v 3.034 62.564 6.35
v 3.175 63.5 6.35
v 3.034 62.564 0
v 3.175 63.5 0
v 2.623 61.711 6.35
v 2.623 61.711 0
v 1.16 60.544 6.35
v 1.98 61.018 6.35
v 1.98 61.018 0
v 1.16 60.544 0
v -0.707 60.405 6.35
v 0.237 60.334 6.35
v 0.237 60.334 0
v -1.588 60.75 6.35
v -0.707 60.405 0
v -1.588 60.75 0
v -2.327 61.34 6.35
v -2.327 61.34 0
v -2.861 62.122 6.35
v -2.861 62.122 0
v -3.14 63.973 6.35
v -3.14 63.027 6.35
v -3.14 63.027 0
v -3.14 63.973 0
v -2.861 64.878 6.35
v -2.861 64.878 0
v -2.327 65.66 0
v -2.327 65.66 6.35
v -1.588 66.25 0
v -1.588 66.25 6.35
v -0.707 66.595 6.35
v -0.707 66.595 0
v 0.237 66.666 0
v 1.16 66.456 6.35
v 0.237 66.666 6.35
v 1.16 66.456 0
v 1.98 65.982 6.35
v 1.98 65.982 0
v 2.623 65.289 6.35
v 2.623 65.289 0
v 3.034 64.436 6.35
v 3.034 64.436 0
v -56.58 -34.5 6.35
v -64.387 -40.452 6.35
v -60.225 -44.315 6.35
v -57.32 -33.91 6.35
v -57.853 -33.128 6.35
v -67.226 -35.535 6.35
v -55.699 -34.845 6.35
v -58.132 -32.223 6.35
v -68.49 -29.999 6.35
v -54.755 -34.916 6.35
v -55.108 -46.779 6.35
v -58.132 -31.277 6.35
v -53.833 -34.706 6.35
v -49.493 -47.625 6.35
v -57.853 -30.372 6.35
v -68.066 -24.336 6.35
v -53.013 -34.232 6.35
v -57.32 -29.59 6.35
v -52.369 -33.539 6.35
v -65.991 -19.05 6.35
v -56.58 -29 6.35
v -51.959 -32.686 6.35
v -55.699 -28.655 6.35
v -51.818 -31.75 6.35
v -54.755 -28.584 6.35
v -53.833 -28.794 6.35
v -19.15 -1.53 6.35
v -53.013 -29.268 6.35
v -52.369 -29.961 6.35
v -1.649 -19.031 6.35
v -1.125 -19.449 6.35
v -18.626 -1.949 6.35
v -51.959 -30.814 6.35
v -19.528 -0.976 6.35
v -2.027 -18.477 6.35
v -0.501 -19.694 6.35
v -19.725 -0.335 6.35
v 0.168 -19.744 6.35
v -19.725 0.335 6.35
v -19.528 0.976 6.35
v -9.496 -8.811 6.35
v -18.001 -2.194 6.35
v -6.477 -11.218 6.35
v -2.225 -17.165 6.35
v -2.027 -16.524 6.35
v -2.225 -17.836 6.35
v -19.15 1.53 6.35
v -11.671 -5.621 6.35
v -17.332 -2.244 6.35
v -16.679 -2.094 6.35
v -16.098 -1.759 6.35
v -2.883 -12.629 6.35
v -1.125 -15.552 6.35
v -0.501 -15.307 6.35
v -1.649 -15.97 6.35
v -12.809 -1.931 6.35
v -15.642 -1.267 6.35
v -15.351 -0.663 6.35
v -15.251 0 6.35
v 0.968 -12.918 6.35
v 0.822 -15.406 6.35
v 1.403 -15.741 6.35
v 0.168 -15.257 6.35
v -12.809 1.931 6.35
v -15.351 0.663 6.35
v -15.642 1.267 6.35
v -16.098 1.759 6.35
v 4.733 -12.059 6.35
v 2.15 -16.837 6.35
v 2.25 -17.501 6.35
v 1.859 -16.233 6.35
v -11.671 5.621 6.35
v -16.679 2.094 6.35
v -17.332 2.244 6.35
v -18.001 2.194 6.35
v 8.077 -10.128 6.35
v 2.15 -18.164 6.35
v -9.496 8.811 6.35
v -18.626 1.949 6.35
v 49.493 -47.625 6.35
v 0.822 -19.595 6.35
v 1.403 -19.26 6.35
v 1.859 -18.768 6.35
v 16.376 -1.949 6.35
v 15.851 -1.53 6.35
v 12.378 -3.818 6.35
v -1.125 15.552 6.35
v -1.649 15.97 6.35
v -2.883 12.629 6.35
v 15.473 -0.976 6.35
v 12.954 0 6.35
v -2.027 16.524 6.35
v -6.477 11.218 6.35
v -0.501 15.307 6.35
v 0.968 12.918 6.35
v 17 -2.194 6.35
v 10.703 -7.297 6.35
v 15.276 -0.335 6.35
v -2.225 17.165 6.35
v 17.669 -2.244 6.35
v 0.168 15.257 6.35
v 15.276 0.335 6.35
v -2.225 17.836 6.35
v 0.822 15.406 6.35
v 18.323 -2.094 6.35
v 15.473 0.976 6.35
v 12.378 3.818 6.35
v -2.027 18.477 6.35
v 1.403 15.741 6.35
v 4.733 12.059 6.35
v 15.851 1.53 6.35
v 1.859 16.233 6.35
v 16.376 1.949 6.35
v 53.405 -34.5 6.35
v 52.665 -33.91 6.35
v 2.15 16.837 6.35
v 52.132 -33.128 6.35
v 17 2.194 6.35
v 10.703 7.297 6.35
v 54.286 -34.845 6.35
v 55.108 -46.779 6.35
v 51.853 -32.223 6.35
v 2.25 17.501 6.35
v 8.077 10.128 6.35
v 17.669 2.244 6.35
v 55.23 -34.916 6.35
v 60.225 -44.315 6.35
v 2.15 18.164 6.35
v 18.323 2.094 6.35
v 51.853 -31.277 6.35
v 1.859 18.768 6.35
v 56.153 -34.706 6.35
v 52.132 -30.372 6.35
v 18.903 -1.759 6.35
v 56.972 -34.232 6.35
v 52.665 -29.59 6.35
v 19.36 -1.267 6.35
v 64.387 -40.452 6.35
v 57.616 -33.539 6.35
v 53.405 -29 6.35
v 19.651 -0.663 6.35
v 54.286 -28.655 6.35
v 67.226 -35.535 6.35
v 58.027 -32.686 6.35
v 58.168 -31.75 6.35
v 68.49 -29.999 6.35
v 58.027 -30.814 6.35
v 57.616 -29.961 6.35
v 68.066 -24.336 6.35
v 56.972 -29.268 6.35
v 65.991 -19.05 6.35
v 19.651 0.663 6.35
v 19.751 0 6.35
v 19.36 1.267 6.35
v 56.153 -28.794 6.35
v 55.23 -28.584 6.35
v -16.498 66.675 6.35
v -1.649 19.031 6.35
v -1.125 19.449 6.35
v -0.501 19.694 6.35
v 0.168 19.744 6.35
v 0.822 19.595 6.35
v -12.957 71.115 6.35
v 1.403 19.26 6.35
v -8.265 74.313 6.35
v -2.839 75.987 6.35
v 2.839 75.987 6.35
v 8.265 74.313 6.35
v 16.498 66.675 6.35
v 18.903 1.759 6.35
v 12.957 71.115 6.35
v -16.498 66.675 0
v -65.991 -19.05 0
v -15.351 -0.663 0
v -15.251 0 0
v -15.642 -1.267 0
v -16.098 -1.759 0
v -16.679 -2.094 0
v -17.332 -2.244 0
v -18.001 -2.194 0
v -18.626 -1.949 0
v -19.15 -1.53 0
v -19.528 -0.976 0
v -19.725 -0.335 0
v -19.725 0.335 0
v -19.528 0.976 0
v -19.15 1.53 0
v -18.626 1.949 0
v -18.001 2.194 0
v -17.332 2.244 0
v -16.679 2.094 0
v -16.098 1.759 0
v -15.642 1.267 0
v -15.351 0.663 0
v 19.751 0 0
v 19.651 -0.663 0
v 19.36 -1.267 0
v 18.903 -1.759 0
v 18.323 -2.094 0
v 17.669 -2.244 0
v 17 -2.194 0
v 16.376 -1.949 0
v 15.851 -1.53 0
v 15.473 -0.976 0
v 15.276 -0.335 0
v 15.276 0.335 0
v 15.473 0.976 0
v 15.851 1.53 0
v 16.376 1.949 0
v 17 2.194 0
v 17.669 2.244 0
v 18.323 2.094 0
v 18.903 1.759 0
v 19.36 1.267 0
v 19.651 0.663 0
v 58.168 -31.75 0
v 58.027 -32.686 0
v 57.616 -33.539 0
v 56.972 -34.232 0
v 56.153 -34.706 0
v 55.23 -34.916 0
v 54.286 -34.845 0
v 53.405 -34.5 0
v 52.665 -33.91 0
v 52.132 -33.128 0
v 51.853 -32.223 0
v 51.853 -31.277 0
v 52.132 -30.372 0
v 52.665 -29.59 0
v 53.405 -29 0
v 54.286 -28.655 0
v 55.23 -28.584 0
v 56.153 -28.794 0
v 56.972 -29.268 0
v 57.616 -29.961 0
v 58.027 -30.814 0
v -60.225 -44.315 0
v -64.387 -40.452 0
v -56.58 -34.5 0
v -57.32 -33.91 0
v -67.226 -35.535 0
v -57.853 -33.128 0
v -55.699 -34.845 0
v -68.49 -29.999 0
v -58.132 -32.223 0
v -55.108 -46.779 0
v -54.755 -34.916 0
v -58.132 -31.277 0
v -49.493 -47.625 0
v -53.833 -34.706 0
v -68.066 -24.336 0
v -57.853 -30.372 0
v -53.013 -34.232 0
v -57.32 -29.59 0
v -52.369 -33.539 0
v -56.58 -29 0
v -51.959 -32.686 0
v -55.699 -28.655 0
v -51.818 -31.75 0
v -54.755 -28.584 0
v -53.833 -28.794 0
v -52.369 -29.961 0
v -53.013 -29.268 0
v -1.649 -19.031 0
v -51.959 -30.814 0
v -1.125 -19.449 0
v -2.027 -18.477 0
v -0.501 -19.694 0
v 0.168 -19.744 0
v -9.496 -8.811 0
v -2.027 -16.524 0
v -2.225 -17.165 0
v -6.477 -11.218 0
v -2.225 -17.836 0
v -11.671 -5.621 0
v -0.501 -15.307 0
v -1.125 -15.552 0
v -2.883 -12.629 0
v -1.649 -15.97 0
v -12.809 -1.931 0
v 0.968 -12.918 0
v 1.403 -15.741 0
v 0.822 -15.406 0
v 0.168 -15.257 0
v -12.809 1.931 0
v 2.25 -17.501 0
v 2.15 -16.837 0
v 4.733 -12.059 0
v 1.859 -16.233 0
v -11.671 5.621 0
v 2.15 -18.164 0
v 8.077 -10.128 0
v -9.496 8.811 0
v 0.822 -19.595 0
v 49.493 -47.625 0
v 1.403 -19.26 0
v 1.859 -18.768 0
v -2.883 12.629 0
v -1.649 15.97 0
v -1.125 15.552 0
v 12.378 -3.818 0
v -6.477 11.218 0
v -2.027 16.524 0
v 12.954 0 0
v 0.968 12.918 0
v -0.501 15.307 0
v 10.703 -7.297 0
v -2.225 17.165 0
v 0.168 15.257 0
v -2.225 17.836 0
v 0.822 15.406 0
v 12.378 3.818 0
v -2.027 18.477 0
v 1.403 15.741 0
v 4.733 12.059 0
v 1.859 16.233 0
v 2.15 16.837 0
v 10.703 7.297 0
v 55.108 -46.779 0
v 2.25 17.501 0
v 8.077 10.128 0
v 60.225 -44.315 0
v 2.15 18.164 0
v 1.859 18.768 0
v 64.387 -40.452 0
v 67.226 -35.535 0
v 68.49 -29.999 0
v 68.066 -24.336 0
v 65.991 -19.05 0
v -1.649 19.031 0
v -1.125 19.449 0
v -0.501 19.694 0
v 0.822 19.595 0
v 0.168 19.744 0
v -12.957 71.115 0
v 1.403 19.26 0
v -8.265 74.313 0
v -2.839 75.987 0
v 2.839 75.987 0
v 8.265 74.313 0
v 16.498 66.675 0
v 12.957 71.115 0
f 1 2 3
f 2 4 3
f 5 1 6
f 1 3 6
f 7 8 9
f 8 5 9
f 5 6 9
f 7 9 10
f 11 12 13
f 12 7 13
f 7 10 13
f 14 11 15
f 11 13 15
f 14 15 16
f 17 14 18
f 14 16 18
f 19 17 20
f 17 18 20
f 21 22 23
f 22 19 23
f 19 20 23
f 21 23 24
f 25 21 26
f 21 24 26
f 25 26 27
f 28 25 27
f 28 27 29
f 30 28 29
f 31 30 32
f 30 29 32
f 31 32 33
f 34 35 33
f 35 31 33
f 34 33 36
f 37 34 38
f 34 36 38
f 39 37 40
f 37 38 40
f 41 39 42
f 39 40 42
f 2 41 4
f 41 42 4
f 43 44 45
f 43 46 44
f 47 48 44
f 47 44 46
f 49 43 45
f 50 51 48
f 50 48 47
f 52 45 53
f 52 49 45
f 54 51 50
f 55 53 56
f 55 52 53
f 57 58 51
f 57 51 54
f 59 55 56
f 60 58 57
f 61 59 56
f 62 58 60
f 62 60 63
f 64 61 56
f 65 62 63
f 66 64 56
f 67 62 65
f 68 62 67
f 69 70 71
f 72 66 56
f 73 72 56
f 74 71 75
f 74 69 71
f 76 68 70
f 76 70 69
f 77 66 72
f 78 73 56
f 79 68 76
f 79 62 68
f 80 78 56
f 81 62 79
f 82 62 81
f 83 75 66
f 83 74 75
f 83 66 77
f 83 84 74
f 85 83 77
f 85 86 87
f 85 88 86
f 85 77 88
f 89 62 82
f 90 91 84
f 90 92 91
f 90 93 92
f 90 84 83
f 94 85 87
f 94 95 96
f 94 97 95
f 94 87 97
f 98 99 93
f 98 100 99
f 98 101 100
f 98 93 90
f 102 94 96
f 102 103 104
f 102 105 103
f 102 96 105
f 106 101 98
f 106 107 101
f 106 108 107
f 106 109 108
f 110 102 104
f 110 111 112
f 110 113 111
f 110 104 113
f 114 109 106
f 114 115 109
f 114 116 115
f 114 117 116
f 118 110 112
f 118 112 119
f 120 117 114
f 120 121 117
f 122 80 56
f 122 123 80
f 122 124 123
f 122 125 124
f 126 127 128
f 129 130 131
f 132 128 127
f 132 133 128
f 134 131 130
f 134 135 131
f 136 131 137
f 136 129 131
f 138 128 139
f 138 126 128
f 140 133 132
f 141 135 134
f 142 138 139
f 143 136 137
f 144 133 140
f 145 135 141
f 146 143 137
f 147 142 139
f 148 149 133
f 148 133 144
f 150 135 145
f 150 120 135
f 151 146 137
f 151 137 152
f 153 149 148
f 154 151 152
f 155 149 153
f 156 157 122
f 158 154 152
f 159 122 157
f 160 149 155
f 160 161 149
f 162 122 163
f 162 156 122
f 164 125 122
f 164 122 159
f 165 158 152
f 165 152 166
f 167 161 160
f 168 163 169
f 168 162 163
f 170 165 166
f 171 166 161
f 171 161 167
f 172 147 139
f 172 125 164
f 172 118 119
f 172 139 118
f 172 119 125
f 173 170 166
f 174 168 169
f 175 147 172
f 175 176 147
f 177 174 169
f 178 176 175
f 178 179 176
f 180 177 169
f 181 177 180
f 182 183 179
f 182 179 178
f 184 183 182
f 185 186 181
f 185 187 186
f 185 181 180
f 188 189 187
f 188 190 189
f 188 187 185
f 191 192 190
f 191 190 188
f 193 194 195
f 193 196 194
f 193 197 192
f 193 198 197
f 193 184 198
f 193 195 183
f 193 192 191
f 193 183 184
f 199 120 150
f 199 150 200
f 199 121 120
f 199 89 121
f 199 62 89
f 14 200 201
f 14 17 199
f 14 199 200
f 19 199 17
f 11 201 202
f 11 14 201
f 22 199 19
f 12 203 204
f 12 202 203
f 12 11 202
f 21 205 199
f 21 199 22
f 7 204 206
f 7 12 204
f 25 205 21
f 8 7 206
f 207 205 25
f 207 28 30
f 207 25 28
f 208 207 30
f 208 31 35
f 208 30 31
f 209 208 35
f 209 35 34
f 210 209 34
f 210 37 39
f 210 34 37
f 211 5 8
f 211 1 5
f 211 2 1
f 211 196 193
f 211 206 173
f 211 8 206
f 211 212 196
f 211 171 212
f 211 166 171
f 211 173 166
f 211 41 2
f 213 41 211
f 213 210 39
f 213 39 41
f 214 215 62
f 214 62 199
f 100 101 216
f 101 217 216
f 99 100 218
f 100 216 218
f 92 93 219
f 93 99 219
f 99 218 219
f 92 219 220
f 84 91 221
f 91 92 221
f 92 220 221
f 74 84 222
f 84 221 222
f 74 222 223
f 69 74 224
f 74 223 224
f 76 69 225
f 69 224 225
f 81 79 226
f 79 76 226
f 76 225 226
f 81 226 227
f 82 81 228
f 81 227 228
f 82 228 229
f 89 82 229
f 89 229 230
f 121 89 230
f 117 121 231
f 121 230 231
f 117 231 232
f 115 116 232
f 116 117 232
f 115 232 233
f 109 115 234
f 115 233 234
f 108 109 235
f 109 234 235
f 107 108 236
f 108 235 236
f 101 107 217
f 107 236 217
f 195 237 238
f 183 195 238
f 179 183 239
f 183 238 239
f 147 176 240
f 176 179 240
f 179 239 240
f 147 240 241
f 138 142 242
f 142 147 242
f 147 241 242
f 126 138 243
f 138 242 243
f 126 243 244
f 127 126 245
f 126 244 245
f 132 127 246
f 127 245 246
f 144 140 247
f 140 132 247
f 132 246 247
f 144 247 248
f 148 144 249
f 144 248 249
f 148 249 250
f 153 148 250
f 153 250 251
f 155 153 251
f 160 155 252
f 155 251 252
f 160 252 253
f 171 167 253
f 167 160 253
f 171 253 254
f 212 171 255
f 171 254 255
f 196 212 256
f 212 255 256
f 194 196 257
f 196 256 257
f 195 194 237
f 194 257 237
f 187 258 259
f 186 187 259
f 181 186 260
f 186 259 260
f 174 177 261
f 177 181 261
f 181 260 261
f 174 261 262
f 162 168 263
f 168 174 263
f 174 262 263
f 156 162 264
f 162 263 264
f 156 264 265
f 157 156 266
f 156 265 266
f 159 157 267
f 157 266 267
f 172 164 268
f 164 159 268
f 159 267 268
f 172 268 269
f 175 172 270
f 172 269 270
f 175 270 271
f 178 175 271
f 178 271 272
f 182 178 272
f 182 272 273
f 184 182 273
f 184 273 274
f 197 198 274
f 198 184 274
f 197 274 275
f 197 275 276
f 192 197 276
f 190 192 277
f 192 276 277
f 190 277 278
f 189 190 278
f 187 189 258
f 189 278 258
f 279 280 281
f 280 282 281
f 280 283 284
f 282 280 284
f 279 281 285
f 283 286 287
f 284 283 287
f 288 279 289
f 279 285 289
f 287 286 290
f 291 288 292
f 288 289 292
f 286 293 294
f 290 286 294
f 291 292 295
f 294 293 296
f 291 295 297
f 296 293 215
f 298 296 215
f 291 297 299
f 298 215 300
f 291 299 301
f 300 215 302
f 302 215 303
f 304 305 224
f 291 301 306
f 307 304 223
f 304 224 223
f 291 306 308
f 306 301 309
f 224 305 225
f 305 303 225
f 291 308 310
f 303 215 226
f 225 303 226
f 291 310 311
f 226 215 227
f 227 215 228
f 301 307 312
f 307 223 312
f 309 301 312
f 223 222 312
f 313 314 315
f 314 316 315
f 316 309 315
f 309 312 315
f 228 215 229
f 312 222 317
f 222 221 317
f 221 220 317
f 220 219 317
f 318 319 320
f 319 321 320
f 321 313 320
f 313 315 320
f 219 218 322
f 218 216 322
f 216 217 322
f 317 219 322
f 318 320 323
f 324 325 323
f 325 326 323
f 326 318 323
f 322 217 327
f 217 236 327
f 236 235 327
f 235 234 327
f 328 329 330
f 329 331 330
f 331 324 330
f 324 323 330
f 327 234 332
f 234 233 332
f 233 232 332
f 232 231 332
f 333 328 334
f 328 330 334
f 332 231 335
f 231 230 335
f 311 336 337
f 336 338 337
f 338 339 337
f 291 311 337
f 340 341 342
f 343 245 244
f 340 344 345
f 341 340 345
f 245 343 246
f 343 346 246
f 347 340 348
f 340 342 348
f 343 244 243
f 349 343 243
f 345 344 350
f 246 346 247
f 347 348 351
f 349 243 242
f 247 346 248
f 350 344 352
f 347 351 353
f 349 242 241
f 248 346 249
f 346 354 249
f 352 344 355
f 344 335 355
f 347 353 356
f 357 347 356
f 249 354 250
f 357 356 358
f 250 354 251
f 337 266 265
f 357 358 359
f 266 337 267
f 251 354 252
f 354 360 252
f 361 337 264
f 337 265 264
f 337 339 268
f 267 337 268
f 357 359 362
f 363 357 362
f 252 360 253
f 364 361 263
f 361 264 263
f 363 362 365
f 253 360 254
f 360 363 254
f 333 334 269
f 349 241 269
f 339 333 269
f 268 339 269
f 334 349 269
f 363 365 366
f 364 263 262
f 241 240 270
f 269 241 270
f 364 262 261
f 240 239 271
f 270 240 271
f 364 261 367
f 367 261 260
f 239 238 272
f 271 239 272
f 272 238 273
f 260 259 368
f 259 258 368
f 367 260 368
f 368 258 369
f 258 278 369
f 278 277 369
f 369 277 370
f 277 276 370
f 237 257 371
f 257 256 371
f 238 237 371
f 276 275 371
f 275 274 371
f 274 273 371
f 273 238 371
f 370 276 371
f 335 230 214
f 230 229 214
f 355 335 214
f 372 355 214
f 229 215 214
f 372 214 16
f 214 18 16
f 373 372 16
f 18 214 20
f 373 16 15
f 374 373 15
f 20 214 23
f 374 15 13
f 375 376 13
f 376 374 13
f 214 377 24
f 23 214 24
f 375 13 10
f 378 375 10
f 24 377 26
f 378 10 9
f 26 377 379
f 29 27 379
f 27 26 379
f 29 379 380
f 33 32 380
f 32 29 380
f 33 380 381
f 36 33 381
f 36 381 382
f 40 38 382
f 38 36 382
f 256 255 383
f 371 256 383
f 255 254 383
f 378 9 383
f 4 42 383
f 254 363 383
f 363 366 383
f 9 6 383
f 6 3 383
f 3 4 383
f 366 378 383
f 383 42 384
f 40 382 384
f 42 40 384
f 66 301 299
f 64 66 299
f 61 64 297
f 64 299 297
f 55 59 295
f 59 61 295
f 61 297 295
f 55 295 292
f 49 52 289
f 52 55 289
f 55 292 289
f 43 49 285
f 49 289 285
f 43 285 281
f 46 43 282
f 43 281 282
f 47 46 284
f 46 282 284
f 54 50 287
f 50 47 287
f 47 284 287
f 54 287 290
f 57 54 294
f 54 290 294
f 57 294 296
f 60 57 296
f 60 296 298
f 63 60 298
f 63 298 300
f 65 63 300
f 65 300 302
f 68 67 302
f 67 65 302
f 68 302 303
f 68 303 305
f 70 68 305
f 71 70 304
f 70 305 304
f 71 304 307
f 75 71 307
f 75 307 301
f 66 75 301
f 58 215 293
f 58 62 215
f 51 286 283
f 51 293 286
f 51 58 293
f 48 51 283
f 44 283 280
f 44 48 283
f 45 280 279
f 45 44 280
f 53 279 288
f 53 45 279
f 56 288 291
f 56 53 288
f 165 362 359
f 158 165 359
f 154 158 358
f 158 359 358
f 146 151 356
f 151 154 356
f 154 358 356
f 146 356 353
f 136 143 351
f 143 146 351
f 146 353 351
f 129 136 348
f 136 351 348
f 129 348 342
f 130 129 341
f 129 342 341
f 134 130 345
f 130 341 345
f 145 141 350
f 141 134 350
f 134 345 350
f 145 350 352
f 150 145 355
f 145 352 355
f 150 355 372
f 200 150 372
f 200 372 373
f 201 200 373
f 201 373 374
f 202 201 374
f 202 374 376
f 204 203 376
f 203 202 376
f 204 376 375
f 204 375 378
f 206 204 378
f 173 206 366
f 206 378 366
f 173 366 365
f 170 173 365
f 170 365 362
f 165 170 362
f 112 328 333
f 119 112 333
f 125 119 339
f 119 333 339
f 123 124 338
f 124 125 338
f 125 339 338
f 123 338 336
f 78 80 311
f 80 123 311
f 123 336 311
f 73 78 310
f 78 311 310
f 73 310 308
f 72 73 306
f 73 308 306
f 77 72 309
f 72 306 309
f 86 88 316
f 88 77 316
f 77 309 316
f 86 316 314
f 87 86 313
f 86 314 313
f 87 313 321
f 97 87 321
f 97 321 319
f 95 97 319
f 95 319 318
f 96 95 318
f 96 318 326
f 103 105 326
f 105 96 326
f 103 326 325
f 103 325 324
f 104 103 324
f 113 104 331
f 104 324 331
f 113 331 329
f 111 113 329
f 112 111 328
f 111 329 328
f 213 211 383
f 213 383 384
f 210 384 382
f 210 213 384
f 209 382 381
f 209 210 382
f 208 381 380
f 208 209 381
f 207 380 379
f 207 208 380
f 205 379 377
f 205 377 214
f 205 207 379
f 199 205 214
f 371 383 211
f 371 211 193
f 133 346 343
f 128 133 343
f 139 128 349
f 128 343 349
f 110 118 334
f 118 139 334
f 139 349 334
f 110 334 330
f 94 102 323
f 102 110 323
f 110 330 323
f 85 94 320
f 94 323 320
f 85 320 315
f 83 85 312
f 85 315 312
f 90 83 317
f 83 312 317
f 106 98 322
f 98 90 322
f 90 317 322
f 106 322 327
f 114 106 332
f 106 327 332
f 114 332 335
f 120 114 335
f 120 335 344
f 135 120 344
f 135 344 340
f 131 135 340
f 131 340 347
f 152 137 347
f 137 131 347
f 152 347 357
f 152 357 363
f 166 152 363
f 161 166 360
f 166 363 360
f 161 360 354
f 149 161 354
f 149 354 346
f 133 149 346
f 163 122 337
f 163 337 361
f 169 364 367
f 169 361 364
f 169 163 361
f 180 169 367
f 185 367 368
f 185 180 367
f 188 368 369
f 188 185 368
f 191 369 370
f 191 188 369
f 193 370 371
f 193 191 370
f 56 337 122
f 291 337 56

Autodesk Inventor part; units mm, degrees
ref_plane "YZ Plane" through (0, 0, 0) normal (1, 0, 0) x (0, 1, 0)
ref_plane "XZ Plane" through (0, 0, 0) normal (0, 1, 0) x (-1, 0, 0)
ref_plane "XY Plane" through (0, 0, 0) normal (0, 0, 1) x (1, 0, 0)
sketch "Sketch2" plane through (0, 0, 0) normal (0, 0, 1) x (1, 0, 0)
  circle A0 centre (0, 0) radius 3.9688
  circle A1 centre (0, 63.5) radius 3.175
  circle A2 centre (-54.9926, -31.75) radius 3.175
  circle A3 centre (54.9926, -31.75) radius 3.175
  line L0 (0, 69.85) -> (60.4919, -34.925) construction
  line L1 (60.4919, -34.925) -> (-60.4919, -34.925) construction
  line L2 (-60.4919, -34.925) -> (0, 69.85) construction
  line L3 (0, 95.25) -> (82.4889, -47.625)
  line L4 (82.4889, -47.625) -> (-82.4889, -47.625)
  line L5 (-82.4889, -47.625) -> (0, 95.25)
  circle A4 centre (0, 0) radius 17.5006 construction
  circle A5 centre (0, 17.5006) radius 2.25
  circle A6 centre (-17.5006, 0) radius 2.25
  circle A7 centre (0, -17.5006) radius 2.25
  circle A8 centre (17.5006, 0) radius 2.25
  circle A9 centre (0, 0) radius 12.954
  dimension "d14" = 35.0012
  dimension "d0" = 7.9375
  dimension "d1" = 6.35
  dimension "d2" = 63.5
  dimension "d5" = 360
  dimension "d8" = 12.7
  dimension "d9" = 12.7
  dimension "d10" = 12.7
  dimension "d15" = 4.5
  dimension "d18" = 360
  dimension "d20" = 25.908
extrude "Extrusion1" add sketch "Sketch2" along normal blind 6.35 contours L3 L4 L5
fillet "Fillet1" radius 19.05 3 edges at (0, 95.25, 3.175) (-82.4889, -47.625, 3.175) (82.4889, -47.625, 3.175)
properties part number "Triangle-motor-hole"
